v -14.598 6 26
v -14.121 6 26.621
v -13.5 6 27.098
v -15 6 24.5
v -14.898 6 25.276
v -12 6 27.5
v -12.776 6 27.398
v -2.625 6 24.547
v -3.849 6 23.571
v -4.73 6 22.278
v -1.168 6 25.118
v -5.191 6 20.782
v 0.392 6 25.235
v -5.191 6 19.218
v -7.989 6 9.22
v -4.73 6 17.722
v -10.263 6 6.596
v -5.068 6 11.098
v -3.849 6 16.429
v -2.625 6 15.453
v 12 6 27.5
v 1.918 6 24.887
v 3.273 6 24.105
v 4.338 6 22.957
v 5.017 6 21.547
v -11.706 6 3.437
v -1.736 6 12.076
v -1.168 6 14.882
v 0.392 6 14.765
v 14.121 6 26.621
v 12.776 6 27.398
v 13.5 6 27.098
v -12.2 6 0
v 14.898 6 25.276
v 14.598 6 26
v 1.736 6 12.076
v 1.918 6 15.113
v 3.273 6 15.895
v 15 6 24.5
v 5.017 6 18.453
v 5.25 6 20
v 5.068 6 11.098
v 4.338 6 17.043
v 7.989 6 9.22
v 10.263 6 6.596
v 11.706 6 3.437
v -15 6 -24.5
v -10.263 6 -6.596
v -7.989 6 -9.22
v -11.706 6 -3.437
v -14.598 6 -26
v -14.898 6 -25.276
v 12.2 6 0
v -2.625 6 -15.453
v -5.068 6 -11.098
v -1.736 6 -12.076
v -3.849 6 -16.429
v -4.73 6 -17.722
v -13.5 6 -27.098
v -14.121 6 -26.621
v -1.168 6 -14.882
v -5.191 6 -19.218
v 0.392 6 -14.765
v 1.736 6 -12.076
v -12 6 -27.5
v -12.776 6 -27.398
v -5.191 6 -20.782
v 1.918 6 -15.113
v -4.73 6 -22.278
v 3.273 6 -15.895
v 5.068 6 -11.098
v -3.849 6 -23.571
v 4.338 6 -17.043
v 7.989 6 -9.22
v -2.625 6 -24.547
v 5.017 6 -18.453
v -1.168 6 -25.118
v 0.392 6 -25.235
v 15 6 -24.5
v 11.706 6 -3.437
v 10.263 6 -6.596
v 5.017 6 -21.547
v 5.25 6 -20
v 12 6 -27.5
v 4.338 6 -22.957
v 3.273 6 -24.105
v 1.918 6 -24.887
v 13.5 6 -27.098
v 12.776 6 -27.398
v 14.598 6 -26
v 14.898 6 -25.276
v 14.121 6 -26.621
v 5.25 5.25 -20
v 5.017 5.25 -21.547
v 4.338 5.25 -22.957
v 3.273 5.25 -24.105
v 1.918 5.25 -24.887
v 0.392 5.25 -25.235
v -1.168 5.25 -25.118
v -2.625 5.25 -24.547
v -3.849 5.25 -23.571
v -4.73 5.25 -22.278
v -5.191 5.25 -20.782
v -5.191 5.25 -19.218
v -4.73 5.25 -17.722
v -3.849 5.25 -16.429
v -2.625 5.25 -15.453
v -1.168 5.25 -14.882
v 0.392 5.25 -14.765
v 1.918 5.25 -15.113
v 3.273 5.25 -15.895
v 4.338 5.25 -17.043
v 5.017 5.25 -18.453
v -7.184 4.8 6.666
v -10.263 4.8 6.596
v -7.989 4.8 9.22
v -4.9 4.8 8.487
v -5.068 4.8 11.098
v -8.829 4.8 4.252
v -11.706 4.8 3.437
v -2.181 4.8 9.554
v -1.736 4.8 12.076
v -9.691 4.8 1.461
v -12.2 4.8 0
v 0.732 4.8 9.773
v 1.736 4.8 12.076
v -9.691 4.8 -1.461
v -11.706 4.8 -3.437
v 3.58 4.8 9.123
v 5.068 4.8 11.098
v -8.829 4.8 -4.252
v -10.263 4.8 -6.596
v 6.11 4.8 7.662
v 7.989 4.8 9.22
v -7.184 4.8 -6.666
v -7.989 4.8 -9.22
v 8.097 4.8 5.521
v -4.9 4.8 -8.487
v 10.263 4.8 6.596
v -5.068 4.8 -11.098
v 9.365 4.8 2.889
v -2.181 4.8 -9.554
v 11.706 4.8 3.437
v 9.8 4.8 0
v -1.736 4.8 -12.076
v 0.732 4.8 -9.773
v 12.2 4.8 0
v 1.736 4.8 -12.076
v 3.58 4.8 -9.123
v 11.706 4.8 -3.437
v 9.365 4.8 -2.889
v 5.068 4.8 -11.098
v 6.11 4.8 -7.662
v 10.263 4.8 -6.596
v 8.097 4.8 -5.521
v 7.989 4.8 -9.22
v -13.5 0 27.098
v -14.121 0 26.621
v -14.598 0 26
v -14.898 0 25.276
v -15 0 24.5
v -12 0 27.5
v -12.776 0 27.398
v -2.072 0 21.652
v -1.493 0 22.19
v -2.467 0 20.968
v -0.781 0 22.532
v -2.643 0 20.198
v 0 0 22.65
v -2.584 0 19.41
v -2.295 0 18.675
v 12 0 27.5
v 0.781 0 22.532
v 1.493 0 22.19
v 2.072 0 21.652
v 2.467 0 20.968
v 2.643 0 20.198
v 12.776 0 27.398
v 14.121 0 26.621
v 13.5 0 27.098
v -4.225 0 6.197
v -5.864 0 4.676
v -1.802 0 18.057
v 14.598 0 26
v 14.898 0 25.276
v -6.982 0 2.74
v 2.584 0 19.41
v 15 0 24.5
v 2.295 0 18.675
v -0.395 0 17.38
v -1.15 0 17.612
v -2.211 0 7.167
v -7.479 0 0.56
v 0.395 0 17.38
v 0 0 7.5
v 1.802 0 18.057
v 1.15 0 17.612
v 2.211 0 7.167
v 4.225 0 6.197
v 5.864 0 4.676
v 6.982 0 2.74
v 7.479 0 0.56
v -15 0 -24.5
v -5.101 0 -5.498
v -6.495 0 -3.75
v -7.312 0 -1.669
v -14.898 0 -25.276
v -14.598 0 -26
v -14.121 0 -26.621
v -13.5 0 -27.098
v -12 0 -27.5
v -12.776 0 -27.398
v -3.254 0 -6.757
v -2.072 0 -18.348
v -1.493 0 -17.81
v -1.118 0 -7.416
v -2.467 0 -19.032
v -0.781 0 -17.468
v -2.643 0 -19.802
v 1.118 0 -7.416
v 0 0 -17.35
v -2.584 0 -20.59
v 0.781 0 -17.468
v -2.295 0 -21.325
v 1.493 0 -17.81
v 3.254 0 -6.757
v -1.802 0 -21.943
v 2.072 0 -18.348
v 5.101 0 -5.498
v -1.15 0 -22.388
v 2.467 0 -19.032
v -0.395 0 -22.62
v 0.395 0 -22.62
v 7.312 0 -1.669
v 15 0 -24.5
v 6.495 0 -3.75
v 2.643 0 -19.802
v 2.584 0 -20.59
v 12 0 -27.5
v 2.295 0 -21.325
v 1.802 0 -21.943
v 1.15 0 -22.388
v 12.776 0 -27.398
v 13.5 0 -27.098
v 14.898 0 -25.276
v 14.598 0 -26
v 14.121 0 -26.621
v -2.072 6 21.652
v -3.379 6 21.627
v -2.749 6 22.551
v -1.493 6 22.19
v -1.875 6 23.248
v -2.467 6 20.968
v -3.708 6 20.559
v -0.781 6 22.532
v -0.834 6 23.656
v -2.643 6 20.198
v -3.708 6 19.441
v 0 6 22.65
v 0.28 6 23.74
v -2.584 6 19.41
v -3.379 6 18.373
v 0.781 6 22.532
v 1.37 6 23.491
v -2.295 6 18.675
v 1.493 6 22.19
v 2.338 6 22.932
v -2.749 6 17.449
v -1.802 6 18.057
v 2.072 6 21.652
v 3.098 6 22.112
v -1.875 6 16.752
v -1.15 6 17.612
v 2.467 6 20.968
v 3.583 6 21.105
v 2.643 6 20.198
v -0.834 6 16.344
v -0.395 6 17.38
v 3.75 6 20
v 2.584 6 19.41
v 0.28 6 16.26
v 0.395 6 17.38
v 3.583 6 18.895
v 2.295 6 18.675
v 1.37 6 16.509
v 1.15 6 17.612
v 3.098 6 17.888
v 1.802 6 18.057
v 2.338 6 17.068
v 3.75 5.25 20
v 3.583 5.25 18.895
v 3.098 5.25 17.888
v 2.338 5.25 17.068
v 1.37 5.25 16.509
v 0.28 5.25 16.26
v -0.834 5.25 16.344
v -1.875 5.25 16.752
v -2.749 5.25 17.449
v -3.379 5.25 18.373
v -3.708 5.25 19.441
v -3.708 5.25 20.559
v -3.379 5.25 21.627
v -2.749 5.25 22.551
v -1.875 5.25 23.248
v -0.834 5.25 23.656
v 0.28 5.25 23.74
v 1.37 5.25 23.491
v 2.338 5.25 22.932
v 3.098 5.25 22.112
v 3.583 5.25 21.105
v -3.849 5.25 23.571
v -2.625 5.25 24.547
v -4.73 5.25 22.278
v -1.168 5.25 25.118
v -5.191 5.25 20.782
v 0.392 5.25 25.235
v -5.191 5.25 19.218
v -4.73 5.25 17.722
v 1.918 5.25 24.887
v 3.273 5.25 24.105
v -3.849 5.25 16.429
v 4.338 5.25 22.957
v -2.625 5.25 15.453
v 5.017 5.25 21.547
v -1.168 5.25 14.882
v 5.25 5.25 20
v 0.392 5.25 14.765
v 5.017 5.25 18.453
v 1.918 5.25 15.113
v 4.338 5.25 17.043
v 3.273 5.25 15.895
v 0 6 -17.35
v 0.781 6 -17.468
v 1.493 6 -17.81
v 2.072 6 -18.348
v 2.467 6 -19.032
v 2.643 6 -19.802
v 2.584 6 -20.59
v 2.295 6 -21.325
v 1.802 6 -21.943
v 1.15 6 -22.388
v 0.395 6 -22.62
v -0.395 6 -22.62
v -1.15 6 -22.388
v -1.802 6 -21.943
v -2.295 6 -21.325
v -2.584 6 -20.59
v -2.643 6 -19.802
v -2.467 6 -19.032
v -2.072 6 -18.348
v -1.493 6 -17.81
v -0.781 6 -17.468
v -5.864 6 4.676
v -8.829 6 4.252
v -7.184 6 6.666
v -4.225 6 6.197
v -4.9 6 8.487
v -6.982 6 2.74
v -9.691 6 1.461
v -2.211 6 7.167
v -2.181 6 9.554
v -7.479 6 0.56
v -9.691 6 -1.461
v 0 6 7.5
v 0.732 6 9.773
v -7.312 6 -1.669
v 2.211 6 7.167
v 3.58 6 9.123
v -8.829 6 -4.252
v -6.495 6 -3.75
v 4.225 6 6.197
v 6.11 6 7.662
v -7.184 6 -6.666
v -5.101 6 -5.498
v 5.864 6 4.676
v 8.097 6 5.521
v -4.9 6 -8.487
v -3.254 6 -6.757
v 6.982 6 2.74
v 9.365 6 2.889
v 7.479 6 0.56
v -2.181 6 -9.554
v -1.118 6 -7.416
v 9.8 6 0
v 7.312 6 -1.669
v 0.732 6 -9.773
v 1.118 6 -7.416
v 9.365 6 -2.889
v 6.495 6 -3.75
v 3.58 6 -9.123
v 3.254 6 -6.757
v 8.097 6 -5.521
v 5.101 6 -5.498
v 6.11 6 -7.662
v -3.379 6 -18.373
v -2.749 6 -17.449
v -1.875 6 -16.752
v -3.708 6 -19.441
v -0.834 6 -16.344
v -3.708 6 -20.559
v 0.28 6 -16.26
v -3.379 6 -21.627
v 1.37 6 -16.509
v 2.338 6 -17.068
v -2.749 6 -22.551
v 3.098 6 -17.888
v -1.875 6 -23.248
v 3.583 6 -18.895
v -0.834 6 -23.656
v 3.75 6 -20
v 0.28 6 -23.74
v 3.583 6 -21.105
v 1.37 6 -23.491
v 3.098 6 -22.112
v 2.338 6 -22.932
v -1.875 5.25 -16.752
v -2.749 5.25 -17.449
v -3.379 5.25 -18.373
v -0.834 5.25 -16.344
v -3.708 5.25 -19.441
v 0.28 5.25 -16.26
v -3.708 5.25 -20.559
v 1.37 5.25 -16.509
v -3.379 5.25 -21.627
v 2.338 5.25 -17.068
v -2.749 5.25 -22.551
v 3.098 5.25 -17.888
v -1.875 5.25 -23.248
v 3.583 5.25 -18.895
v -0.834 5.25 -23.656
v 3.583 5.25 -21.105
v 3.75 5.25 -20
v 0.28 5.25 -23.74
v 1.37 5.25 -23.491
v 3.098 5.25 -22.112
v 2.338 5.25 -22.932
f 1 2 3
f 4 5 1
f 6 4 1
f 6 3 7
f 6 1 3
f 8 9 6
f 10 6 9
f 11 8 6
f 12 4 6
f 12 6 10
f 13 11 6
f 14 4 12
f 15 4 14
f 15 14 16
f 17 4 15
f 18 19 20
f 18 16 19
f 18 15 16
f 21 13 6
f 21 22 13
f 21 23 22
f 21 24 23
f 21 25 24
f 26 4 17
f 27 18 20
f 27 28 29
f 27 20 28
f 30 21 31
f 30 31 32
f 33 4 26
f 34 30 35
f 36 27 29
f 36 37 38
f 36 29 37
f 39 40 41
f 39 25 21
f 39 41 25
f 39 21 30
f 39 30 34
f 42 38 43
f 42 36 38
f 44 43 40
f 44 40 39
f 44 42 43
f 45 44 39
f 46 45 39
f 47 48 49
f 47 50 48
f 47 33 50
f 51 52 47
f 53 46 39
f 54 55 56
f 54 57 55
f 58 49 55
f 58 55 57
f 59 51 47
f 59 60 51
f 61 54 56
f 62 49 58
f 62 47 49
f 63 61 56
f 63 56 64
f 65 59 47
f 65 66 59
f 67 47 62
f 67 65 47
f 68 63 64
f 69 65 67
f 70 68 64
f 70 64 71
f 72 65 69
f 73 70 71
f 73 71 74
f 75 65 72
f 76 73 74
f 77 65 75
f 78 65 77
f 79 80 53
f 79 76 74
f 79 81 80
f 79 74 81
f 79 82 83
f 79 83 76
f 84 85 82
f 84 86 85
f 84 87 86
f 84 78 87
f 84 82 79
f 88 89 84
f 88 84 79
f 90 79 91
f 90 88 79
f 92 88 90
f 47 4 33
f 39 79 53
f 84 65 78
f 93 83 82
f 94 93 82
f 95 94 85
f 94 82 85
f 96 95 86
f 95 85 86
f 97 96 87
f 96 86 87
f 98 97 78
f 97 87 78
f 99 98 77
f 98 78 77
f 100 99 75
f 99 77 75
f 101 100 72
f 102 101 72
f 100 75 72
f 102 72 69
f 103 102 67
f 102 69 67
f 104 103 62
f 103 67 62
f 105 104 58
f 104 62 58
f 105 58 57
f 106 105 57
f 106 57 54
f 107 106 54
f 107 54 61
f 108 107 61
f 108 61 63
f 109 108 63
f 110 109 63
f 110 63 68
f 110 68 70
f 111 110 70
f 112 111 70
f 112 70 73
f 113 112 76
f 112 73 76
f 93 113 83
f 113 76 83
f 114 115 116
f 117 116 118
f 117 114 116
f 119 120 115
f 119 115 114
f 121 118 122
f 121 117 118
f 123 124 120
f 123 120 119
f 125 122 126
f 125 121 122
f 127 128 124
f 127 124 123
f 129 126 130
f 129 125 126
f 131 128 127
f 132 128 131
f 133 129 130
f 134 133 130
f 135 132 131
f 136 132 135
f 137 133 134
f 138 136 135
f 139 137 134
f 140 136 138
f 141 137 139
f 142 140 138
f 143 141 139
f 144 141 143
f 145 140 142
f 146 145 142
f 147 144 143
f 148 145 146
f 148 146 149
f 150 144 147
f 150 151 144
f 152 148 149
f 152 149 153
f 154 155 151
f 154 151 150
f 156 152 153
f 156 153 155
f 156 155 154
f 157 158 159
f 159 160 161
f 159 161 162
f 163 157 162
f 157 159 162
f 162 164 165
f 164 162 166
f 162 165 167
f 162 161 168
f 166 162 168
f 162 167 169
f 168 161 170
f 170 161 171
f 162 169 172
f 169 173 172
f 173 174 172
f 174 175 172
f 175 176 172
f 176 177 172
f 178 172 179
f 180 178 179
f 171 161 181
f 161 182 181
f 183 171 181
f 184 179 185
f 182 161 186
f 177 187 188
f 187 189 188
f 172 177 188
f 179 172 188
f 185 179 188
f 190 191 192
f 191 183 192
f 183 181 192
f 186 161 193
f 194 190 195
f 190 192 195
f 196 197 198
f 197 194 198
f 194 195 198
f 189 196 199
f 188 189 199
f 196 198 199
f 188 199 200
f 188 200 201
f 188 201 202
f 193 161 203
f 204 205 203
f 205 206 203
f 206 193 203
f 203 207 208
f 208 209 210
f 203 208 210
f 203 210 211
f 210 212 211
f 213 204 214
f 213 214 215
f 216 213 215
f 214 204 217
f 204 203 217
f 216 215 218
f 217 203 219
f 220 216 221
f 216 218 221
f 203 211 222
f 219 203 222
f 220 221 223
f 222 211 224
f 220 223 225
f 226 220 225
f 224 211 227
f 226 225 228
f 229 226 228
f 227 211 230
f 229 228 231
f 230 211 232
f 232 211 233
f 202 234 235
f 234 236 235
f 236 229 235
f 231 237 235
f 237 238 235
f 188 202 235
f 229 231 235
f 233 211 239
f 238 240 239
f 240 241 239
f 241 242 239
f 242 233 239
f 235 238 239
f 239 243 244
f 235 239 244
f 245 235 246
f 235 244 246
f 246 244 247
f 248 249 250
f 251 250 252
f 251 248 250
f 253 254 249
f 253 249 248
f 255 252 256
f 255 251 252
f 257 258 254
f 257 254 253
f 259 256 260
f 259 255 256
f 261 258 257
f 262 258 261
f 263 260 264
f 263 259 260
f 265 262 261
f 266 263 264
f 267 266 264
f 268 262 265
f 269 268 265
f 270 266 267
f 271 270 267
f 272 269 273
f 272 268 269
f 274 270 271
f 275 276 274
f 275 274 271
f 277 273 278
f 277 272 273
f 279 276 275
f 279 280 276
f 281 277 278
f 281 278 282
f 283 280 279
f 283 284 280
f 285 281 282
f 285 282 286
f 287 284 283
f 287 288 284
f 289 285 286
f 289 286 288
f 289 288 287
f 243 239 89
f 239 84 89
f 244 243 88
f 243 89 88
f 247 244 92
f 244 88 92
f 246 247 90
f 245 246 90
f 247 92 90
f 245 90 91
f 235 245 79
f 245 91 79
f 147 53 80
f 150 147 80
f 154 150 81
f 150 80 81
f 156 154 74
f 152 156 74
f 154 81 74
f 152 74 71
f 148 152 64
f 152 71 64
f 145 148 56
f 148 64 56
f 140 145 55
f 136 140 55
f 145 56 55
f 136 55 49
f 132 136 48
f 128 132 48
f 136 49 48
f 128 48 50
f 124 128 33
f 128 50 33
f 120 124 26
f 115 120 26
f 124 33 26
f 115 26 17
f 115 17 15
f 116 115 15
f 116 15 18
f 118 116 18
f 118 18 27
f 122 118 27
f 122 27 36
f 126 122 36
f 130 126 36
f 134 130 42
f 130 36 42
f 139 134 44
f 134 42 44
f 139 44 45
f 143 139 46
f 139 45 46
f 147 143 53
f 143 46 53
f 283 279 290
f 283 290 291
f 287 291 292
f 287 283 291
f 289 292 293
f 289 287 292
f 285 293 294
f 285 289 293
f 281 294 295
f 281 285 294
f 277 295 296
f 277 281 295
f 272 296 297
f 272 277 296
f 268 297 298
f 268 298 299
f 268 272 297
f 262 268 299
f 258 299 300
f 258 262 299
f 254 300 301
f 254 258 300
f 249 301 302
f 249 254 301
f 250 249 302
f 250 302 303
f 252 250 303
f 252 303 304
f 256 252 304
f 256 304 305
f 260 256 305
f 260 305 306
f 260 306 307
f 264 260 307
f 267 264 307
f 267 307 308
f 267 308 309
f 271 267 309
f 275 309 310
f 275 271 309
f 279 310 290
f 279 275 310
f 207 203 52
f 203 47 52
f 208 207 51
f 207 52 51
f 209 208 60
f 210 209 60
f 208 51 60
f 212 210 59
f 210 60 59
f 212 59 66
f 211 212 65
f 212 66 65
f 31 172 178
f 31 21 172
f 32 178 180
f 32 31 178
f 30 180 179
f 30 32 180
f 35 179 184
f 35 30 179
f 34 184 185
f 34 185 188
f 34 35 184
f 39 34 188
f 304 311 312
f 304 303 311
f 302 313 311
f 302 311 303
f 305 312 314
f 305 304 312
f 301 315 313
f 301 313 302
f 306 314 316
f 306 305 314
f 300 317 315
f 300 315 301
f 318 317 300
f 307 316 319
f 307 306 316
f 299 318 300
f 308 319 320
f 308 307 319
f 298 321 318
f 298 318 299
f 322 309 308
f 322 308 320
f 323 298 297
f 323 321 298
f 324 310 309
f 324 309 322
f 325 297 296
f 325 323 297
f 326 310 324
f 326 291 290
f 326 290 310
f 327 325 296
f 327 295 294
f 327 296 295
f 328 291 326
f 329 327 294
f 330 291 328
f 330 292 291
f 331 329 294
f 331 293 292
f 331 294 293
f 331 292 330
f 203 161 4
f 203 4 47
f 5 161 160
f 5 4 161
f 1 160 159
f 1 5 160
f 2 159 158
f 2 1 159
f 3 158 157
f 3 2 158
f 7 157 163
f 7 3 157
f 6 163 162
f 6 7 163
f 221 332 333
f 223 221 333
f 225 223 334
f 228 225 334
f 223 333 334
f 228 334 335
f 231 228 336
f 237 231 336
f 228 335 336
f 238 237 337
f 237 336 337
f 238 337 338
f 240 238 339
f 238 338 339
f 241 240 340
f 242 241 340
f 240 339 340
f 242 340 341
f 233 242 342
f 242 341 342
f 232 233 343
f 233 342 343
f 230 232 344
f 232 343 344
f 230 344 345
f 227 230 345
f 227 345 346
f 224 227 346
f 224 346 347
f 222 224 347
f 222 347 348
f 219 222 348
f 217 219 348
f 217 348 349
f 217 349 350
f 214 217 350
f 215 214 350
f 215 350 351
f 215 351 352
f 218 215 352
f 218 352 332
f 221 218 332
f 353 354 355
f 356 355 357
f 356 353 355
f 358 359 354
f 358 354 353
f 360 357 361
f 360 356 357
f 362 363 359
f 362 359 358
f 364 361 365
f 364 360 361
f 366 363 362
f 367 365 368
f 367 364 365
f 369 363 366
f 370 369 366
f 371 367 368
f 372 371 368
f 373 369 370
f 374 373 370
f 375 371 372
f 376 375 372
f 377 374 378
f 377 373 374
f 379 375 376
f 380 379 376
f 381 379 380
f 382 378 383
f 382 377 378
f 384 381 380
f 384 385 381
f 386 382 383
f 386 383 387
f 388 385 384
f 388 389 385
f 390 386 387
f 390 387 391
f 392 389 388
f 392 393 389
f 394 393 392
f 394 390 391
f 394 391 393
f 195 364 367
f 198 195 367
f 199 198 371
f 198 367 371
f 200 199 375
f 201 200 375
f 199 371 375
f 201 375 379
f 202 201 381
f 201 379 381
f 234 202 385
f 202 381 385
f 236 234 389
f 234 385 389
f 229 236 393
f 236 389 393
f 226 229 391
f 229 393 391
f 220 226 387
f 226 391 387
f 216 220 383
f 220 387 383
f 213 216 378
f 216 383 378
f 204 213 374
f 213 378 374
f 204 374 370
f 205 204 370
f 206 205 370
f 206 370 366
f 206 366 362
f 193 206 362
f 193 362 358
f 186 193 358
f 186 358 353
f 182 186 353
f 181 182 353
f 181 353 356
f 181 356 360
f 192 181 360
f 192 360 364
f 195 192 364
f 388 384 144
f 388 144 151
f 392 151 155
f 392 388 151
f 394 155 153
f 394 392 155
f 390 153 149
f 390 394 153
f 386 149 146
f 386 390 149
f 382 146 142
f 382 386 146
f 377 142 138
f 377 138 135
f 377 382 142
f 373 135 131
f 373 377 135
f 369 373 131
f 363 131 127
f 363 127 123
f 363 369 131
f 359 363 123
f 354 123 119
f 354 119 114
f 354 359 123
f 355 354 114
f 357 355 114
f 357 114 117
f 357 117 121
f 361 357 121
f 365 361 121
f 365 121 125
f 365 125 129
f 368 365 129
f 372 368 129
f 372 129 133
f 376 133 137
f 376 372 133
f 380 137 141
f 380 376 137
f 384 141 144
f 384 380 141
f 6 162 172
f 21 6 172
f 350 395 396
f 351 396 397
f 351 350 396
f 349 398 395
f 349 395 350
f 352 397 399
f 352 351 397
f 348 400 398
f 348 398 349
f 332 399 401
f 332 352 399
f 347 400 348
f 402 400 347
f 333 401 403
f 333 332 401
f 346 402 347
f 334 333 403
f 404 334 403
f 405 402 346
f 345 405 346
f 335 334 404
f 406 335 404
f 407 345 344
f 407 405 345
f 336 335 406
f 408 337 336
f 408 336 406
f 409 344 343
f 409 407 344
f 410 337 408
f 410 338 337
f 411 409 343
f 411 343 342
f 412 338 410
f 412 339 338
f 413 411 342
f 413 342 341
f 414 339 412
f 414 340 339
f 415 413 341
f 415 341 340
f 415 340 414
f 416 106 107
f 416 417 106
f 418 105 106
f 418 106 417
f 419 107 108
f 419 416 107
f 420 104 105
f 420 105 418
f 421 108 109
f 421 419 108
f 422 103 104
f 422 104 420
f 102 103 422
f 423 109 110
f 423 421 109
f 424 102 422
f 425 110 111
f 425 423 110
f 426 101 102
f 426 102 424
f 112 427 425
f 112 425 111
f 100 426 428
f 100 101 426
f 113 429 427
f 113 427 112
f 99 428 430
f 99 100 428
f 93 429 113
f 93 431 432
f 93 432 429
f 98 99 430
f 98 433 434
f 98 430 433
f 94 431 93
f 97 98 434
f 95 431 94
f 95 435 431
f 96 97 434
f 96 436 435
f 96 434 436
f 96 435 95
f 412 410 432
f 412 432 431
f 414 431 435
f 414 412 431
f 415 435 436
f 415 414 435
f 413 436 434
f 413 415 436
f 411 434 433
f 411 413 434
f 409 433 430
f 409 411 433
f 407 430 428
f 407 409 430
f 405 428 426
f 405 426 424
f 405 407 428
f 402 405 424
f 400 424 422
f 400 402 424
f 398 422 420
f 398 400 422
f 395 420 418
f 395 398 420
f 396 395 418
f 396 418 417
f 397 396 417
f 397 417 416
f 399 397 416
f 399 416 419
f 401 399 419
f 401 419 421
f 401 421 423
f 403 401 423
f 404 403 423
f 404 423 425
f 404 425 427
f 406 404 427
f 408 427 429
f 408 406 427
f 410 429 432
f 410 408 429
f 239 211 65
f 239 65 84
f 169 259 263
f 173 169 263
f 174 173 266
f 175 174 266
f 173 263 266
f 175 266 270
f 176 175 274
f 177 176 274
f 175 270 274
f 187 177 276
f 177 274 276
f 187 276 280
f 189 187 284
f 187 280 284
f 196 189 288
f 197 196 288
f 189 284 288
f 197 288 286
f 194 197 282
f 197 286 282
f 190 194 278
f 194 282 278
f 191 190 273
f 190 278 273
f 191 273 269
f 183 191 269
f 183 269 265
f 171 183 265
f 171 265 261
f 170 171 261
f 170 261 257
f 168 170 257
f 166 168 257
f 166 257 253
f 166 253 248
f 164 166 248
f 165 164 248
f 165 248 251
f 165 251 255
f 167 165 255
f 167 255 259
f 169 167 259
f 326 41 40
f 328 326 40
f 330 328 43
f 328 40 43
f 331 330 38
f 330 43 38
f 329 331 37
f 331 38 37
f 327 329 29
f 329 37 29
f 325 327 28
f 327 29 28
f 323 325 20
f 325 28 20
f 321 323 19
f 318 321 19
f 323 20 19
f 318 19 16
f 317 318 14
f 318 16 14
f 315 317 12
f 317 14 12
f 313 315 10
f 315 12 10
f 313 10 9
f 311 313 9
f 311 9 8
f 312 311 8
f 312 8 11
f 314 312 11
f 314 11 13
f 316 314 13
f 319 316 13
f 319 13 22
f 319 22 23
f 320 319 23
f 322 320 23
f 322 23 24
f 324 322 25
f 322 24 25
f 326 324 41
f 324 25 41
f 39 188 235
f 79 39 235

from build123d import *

# Parameters (mm, degrees)
ESQUISSE1_W                     = 30
ESQUISSE1_H                     = 55
PLAQUE_PLEXI_DEPTH              = 6
PASSAGE_JAUGE_LAITON_REACH      = 33.894
ESQUISSE5_R                     = 7.5
PASSAGE_CROU_M5_REACH           = 33.894
ESQUISSE6_R                     = 2.65
ESQUISSE2_R                     = 12.2
ESQUISSE2_R_2                   = 9.8
GORGE_JOINT_CENTRAL_DEPTH       = 1.2
ESQUISSE7_R                     = 5.25
ESQUISSE7_R_2                   = 3.75
ENL_V_DE_MAT_EXTRU_MINCE2_DEPTH = 0.75
CONG_1_R                        = 3


with BuildPart() as part:
    # Esquisse1 → Plaque Plexi (new body)
    with BuildSketch(Plane(origin=(0, 0, 0), x_dir=(1, 0, 0), z_dir=(0, 1, 0))):
        Rectangle(ESQUISSE1_W, ESQUISSE1_H)
    extrude(amount=PLAQUE_PLEXI_DEPTH)

    # Esquisse5 → Passage Jauge Laiton (cut, up to next)
    with BuildSketch(Plane(origin=(0, 6, 0), x_dir=(1, 0, 0), z_dir=(0, 1, 0)), mode=Mode.PRIVATE) as passage_jauge_laiton_sk1:
        with Locations(Location((0, 0, 0), (0, 0, 270))):
            Circle(ESQUISSE5_R)
    passage_jauge_laiton_tool1 = extrude(passage_jauge_laiton_sk1.sketch, amount=-PASSAGE_JAUGE_LAITON_REACH, mode=Mode.PRIVATE) & part.part
    add(passage_jauge_laiton_tool1.solids().sort_by_distance((0, 6, 0))[0], mode=Mode.SUBTRACT)

    # Esquisse6 → Passage écrou M5 (cut, up to next)
    with BuildSketch(Plane(origin=(0, 6, 0), x_dir=(1, 0, 0), z_dir=(0, 1, 0)), mode=Mode.PRIVATE) as passage_crou_m5_sk1:
        with Locations(Location((0, 20, 0), (0, 0, 270))):
            Circle(ESQUISSE6_R)
    passage_crou_m5_tool1 = extrude(passage_crou_m5_sk1.sketch, amount=-PASSAGE_CROU_M5_REACH, mode=Mode.PRIVATE) & part.part
    # Esquisse6 → Passage écrou M5 (cut, up to next)
    with BuildSketch(Plane(origin=(0, 6, 0), x_dir=(1, 0, 0), z_dir=(0, 1, 0)), mode=Mode.PRIVATE) as passage_crou_m5_sk2:
        with Locations(Location((0, -20, 0), (0, 0, 270))):
            Circle(ESQUISSE6_R)
    passage_crou_m5_tool2 = extrude(passage_crou_m5_sk2.sketch, amount=-PASSAGE_CROU_M5_REACH, mode=Mode.PRIVATE) & part.part
    add(passage_crou_m5_tool1.solids().sort_by_distance((0, 6, -20))[0], mode=Mode.SUBTRACT)
    add(passage_crou_m5_tool2.solids().sort_by_distance((0, 6, 20))[0], mode=Mode.SUBTRACT)

    # Esquisse2 → Gorge_Joint_central (cut)
    with BuildSketch(Plane(origin=(0, 6, 0), x_dir=(1, 0, 0), z_dir=(0, 1, 0))):
        Circle(ESQUISSE2_R)
        Circle(ESQUISSE2_R_2, mode=Mode.SUBTRACT)
    extrude(amount=-GORGE_JOINT_CENTRAL_DEPTH, mode=Mode.SUBTRACT)

    # Esquisse7 → Enlèv. de mat.-Extru.-Mince2 (cut)
    # profile 1 of 2: a face of its own
    with BuildSketch(Plane(origin=(0, 6, 0), x_dir=(1, 0, 0), z_dir=(0, 1, 0))):
        with Locations((0, -20)):
            Circle(ESQUISSE7_R)
        with Locations((0, -20)):
            Circle(ESQUISSE7_R_2, mode=Mode.SUBTRACT)
    # profile 2 of 2: a face of its own
    with BuildSketch(Plane(origin=(0, 6, 0), x_dir=(1, 0, 0), z_dir=(0, 1, 0))):
        with Locations((0, 20)):
            Circle(ESQUISSE7_R)
        with Locations((0, 20)):
            Circle(ESQUISSE7_R_2, mode=Mode.SUBTRACT)
    extrude(amount=-ENL_V_DE_MAT_EXTRU_MINCE2_DEPTH, mode=Mode.SUBTRACT)

    # Congé1
    cong_1_edges = [part.edges().sort_by_distance(p)[0] for p in [
        (-15, 3, -27.5),
        (15, 3, -27.5),
        (15, 3, 27.5),
        (-15, 3, 27.5),
    ]]
    fillet(cong_1_edges, radius=CONG_1_R)


solid = part.part
